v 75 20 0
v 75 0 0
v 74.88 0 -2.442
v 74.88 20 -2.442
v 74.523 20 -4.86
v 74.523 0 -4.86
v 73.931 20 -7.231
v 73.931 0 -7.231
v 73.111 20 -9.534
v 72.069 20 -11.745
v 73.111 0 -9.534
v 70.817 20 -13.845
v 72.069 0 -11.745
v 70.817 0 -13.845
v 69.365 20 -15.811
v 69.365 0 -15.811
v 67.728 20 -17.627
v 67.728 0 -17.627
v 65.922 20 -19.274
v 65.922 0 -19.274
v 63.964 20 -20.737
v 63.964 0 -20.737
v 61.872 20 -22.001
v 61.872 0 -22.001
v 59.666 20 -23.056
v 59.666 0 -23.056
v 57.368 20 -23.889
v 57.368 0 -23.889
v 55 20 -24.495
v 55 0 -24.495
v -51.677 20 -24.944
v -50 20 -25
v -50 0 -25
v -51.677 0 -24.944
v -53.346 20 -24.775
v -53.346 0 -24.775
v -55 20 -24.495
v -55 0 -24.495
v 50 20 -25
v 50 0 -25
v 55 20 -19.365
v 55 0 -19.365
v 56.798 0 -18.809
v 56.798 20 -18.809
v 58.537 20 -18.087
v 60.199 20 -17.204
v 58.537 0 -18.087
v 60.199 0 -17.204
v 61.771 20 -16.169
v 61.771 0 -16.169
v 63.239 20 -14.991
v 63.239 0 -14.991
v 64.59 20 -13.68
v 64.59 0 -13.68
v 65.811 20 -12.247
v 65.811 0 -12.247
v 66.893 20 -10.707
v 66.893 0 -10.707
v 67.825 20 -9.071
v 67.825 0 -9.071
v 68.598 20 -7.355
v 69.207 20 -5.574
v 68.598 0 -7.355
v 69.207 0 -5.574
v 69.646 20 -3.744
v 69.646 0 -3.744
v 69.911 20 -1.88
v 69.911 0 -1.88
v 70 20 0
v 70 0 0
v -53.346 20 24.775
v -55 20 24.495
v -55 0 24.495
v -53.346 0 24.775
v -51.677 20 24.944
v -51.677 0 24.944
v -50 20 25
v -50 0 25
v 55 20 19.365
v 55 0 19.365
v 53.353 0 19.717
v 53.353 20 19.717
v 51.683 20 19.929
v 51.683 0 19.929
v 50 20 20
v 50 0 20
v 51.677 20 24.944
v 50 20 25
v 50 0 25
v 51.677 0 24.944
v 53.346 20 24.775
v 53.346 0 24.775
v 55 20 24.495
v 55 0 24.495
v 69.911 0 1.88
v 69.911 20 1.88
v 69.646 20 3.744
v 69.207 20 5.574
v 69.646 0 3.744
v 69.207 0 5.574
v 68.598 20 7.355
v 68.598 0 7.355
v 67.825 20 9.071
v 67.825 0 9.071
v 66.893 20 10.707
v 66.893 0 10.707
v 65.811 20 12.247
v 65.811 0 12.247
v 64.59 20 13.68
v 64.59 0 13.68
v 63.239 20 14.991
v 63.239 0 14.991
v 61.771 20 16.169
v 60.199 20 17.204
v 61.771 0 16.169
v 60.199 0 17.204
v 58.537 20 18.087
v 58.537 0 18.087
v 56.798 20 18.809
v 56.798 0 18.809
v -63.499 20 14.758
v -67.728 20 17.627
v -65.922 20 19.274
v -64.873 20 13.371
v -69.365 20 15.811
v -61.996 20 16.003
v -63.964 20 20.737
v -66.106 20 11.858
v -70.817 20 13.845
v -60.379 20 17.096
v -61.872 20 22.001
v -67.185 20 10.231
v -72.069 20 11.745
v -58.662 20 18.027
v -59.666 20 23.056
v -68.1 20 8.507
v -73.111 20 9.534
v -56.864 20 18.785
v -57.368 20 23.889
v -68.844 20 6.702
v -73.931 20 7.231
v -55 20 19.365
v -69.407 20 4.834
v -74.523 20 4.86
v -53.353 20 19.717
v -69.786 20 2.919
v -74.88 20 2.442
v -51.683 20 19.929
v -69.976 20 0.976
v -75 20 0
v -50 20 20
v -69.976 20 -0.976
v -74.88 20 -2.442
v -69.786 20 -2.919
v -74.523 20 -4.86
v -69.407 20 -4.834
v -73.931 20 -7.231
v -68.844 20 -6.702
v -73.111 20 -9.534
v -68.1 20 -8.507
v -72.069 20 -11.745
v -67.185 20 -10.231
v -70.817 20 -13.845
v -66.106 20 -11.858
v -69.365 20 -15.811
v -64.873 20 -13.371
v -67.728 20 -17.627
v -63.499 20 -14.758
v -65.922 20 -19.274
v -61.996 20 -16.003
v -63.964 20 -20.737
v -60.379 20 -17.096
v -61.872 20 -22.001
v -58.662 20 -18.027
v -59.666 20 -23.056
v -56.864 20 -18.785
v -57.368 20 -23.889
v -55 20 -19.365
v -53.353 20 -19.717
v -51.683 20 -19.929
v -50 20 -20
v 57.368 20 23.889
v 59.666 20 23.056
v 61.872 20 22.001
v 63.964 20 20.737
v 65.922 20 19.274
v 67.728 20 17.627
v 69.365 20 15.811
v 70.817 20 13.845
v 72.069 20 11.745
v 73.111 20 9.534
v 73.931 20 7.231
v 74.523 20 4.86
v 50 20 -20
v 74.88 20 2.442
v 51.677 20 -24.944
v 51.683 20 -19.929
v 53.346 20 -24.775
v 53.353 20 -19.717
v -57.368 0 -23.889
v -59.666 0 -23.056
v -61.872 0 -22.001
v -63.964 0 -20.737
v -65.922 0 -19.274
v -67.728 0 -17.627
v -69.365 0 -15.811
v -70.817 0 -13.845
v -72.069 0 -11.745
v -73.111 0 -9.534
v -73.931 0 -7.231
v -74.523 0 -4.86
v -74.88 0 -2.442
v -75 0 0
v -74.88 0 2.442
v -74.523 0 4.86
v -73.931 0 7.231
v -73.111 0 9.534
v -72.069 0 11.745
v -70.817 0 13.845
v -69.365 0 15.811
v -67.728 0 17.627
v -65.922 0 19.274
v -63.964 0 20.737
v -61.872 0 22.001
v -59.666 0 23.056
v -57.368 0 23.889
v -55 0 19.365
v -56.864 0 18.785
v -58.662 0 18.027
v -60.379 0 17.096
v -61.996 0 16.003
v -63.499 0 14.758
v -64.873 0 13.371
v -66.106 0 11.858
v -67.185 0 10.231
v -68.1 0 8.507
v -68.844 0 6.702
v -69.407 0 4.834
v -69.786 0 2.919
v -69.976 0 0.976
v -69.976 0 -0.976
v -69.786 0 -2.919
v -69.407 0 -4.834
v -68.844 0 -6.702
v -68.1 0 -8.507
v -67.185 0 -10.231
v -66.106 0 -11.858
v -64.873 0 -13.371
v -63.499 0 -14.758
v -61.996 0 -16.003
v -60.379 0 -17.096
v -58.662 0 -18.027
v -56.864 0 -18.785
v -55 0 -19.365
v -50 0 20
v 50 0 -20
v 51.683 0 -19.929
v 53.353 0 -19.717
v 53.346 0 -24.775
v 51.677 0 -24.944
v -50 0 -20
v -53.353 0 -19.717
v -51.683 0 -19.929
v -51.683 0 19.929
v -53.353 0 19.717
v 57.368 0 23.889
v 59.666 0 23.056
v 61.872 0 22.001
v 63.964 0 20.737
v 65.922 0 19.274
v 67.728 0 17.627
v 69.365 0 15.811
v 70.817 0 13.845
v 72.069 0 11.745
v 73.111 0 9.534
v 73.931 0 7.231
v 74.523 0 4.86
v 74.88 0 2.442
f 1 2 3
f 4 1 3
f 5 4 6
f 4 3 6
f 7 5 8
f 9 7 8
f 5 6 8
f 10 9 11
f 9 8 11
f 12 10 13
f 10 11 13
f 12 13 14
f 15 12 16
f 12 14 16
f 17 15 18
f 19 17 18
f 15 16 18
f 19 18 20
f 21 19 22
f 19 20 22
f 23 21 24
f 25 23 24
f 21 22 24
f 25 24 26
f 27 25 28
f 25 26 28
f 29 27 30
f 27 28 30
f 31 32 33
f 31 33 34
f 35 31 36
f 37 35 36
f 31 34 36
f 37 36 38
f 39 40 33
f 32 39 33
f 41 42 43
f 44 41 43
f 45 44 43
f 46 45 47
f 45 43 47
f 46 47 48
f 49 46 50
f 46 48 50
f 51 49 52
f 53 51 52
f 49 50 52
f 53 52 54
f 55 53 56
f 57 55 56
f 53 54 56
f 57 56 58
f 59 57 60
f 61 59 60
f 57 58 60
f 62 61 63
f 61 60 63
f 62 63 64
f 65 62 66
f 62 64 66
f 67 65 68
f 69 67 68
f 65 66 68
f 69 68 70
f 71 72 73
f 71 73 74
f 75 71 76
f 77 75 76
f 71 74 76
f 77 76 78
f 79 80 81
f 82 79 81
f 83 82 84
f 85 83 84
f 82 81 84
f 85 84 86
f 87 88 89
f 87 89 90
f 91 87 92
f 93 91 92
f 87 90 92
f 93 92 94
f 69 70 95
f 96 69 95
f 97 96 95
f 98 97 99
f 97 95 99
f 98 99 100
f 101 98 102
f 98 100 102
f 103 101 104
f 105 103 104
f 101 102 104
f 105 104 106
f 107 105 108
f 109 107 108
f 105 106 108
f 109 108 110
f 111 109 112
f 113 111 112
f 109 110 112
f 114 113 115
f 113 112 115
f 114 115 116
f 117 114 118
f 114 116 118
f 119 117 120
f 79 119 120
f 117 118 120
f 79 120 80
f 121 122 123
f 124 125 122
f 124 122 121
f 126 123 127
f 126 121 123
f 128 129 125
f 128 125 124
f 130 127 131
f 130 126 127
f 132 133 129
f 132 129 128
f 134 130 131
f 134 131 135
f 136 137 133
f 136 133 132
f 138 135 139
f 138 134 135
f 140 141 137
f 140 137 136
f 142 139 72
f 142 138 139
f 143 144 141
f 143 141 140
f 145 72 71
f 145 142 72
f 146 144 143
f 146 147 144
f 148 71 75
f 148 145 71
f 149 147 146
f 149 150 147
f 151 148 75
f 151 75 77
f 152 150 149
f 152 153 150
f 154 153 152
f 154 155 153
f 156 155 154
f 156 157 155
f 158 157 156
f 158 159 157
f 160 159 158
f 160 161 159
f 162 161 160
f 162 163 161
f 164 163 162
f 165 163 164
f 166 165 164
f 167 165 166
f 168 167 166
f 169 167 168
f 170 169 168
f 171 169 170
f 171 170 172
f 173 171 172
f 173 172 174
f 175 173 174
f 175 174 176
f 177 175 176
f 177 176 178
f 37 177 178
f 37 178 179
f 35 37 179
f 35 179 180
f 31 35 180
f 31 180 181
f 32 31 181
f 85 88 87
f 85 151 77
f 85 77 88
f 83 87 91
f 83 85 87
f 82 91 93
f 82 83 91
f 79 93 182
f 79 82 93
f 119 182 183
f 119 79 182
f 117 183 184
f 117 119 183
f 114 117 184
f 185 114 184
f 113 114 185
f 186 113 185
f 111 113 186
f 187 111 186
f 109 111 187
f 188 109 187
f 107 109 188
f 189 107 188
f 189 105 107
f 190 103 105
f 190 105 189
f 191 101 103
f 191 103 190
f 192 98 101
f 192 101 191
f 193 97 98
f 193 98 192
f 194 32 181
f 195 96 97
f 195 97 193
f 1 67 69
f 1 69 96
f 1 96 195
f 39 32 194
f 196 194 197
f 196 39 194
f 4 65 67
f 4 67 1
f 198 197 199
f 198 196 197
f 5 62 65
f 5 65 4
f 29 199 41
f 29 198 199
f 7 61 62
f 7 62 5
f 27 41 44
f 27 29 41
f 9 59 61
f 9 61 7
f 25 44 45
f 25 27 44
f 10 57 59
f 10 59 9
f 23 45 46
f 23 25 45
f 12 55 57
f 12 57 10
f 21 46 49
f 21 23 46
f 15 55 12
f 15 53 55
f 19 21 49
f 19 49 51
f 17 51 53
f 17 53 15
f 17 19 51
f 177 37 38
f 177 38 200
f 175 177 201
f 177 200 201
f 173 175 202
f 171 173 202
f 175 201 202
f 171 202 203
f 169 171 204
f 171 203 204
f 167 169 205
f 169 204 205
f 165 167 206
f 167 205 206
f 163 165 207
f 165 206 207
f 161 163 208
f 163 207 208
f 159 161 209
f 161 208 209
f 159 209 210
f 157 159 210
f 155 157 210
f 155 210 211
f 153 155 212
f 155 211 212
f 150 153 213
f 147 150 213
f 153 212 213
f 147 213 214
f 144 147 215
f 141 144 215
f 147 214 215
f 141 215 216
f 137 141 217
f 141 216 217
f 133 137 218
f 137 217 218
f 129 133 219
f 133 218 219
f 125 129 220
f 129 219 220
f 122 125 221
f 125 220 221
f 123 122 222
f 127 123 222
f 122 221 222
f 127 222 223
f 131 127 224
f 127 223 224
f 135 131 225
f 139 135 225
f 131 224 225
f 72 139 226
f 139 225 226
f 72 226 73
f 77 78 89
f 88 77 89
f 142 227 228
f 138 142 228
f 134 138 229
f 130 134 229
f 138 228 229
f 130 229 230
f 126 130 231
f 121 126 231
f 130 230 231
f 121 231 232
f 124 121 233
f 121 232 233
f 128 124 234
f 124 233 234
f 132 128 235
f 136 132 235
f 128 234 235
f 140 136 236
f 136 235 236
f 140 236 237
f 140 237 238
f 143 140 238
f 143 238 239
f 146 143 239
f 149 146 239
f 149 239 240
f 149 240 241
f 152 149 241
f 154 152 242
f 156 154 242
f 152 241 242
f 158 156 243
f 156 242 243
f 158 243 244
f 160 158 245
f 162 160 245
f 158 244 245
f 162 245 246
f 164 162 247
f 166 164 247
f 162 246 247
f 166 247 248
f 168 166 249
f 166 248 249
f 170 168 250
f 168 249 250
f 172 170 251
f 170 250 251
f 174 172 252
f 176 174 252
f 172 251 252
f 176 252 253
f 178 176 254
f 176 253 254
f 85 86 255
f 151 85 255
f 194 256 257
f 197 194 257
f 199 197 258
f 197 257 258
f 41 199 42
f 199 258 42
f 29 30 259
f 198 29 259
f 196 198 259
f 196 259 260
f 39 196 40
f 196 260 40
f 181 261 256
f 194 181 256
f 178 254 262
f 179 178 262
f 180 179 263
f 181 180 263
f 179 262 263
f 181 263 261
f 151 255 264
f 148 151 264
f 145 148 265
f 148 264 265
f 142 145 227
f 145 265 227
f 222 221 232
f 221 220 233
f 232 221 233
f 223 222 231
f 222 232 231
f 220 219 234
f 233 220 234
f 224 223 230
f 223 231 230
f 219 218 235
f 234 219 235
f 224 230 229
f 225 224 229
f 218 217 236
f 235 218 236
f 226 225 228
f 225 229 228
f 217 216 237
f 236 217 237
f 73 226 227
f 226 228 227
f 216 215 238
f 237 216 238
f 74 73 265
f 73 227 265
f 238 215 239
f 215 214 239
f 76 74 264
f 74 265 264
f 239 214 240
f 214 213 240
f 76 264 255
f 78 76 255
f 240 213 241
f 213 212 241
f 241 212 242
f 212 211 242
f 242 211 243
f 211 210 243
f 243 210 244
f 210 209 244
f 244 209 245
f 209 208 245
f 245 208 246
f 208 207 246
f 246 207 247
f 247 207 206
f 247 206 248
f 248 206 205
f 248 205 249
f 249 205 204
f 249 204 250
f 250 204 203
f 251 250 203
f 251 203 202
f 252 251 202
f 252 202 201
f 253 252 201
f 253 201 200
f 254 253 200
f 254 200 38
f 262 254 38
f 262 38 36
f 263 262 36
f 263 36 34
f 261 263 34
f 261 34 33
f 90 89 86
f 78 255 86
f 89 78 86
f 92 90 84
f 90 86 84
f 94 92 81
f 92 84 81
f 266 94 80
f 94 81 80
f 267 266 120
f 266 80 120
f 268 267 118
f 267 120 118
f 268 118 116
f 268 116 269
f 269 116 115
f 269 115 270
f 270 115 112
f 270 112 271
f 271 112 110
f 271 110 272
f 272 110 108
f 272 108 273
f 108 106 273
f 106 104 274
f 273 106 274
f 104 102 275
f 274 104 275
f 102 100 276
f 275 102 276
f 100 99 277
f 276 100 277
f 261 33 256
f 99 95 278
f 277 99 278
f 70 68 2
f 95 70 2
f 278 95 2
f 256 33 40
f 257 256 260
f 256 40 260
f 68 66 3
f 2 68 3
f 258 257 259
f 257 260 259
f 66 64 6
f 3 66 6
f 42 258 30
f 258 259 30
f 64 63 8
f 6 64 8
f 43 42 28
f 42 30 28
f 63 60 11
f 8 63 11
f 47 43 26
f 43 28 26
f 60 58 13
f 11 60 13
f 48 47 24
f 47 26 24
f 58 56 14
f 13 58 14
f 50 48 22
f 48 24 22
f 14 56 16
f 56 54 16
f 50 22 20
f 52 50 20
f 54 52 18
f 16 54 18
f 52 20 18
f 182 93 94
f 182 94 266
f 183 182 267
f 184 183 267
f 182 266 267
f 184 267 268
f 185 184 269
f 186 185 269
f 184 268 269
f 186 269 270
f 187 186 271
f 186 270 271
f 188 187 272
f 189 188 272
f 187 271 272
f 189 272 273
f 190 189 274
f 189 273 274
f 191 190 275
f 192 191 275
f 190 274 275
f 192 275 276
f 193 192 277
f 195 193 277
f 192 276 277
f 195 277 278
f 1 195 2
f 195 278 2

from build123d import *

# Parameters (mm, degrees)
BOSS_EXTRUDE4_DEPTH = 20


with BuildPart() as part:
    # Sketch1 → Boss-Extrude4 (new body)
    with BuildSketch(Plane(origin=(0, 0, 0), x_dir=(1, 0, 0), z_dir=(0, 1, 0))):
        with BuildLine():
            Line((-50, -25), (50, -25))
            ThreePointArc((50, -25), (75, -3.4e-08), (50.000000068, 25))
            Line((50.000000068, 25), (-50, 25))
            ThreePointArc((-50, 25), (-75, 0), (-50, -25))
        make_face()
        with BuildLine():
            ThreePointArc((-50, -20), (-70, 0), (-50, 20))
            Line((-50, 20), (50, 20))
            ThreePointArc((50, 20), (70, 0), (50, -20))
            Line((50, -20), (-50, -20))
        make_face(mode=Mode.SUBTRACT)
    extrude(amount=BOSS_EXTRUDE4_DEPTH)


solid = part.part
